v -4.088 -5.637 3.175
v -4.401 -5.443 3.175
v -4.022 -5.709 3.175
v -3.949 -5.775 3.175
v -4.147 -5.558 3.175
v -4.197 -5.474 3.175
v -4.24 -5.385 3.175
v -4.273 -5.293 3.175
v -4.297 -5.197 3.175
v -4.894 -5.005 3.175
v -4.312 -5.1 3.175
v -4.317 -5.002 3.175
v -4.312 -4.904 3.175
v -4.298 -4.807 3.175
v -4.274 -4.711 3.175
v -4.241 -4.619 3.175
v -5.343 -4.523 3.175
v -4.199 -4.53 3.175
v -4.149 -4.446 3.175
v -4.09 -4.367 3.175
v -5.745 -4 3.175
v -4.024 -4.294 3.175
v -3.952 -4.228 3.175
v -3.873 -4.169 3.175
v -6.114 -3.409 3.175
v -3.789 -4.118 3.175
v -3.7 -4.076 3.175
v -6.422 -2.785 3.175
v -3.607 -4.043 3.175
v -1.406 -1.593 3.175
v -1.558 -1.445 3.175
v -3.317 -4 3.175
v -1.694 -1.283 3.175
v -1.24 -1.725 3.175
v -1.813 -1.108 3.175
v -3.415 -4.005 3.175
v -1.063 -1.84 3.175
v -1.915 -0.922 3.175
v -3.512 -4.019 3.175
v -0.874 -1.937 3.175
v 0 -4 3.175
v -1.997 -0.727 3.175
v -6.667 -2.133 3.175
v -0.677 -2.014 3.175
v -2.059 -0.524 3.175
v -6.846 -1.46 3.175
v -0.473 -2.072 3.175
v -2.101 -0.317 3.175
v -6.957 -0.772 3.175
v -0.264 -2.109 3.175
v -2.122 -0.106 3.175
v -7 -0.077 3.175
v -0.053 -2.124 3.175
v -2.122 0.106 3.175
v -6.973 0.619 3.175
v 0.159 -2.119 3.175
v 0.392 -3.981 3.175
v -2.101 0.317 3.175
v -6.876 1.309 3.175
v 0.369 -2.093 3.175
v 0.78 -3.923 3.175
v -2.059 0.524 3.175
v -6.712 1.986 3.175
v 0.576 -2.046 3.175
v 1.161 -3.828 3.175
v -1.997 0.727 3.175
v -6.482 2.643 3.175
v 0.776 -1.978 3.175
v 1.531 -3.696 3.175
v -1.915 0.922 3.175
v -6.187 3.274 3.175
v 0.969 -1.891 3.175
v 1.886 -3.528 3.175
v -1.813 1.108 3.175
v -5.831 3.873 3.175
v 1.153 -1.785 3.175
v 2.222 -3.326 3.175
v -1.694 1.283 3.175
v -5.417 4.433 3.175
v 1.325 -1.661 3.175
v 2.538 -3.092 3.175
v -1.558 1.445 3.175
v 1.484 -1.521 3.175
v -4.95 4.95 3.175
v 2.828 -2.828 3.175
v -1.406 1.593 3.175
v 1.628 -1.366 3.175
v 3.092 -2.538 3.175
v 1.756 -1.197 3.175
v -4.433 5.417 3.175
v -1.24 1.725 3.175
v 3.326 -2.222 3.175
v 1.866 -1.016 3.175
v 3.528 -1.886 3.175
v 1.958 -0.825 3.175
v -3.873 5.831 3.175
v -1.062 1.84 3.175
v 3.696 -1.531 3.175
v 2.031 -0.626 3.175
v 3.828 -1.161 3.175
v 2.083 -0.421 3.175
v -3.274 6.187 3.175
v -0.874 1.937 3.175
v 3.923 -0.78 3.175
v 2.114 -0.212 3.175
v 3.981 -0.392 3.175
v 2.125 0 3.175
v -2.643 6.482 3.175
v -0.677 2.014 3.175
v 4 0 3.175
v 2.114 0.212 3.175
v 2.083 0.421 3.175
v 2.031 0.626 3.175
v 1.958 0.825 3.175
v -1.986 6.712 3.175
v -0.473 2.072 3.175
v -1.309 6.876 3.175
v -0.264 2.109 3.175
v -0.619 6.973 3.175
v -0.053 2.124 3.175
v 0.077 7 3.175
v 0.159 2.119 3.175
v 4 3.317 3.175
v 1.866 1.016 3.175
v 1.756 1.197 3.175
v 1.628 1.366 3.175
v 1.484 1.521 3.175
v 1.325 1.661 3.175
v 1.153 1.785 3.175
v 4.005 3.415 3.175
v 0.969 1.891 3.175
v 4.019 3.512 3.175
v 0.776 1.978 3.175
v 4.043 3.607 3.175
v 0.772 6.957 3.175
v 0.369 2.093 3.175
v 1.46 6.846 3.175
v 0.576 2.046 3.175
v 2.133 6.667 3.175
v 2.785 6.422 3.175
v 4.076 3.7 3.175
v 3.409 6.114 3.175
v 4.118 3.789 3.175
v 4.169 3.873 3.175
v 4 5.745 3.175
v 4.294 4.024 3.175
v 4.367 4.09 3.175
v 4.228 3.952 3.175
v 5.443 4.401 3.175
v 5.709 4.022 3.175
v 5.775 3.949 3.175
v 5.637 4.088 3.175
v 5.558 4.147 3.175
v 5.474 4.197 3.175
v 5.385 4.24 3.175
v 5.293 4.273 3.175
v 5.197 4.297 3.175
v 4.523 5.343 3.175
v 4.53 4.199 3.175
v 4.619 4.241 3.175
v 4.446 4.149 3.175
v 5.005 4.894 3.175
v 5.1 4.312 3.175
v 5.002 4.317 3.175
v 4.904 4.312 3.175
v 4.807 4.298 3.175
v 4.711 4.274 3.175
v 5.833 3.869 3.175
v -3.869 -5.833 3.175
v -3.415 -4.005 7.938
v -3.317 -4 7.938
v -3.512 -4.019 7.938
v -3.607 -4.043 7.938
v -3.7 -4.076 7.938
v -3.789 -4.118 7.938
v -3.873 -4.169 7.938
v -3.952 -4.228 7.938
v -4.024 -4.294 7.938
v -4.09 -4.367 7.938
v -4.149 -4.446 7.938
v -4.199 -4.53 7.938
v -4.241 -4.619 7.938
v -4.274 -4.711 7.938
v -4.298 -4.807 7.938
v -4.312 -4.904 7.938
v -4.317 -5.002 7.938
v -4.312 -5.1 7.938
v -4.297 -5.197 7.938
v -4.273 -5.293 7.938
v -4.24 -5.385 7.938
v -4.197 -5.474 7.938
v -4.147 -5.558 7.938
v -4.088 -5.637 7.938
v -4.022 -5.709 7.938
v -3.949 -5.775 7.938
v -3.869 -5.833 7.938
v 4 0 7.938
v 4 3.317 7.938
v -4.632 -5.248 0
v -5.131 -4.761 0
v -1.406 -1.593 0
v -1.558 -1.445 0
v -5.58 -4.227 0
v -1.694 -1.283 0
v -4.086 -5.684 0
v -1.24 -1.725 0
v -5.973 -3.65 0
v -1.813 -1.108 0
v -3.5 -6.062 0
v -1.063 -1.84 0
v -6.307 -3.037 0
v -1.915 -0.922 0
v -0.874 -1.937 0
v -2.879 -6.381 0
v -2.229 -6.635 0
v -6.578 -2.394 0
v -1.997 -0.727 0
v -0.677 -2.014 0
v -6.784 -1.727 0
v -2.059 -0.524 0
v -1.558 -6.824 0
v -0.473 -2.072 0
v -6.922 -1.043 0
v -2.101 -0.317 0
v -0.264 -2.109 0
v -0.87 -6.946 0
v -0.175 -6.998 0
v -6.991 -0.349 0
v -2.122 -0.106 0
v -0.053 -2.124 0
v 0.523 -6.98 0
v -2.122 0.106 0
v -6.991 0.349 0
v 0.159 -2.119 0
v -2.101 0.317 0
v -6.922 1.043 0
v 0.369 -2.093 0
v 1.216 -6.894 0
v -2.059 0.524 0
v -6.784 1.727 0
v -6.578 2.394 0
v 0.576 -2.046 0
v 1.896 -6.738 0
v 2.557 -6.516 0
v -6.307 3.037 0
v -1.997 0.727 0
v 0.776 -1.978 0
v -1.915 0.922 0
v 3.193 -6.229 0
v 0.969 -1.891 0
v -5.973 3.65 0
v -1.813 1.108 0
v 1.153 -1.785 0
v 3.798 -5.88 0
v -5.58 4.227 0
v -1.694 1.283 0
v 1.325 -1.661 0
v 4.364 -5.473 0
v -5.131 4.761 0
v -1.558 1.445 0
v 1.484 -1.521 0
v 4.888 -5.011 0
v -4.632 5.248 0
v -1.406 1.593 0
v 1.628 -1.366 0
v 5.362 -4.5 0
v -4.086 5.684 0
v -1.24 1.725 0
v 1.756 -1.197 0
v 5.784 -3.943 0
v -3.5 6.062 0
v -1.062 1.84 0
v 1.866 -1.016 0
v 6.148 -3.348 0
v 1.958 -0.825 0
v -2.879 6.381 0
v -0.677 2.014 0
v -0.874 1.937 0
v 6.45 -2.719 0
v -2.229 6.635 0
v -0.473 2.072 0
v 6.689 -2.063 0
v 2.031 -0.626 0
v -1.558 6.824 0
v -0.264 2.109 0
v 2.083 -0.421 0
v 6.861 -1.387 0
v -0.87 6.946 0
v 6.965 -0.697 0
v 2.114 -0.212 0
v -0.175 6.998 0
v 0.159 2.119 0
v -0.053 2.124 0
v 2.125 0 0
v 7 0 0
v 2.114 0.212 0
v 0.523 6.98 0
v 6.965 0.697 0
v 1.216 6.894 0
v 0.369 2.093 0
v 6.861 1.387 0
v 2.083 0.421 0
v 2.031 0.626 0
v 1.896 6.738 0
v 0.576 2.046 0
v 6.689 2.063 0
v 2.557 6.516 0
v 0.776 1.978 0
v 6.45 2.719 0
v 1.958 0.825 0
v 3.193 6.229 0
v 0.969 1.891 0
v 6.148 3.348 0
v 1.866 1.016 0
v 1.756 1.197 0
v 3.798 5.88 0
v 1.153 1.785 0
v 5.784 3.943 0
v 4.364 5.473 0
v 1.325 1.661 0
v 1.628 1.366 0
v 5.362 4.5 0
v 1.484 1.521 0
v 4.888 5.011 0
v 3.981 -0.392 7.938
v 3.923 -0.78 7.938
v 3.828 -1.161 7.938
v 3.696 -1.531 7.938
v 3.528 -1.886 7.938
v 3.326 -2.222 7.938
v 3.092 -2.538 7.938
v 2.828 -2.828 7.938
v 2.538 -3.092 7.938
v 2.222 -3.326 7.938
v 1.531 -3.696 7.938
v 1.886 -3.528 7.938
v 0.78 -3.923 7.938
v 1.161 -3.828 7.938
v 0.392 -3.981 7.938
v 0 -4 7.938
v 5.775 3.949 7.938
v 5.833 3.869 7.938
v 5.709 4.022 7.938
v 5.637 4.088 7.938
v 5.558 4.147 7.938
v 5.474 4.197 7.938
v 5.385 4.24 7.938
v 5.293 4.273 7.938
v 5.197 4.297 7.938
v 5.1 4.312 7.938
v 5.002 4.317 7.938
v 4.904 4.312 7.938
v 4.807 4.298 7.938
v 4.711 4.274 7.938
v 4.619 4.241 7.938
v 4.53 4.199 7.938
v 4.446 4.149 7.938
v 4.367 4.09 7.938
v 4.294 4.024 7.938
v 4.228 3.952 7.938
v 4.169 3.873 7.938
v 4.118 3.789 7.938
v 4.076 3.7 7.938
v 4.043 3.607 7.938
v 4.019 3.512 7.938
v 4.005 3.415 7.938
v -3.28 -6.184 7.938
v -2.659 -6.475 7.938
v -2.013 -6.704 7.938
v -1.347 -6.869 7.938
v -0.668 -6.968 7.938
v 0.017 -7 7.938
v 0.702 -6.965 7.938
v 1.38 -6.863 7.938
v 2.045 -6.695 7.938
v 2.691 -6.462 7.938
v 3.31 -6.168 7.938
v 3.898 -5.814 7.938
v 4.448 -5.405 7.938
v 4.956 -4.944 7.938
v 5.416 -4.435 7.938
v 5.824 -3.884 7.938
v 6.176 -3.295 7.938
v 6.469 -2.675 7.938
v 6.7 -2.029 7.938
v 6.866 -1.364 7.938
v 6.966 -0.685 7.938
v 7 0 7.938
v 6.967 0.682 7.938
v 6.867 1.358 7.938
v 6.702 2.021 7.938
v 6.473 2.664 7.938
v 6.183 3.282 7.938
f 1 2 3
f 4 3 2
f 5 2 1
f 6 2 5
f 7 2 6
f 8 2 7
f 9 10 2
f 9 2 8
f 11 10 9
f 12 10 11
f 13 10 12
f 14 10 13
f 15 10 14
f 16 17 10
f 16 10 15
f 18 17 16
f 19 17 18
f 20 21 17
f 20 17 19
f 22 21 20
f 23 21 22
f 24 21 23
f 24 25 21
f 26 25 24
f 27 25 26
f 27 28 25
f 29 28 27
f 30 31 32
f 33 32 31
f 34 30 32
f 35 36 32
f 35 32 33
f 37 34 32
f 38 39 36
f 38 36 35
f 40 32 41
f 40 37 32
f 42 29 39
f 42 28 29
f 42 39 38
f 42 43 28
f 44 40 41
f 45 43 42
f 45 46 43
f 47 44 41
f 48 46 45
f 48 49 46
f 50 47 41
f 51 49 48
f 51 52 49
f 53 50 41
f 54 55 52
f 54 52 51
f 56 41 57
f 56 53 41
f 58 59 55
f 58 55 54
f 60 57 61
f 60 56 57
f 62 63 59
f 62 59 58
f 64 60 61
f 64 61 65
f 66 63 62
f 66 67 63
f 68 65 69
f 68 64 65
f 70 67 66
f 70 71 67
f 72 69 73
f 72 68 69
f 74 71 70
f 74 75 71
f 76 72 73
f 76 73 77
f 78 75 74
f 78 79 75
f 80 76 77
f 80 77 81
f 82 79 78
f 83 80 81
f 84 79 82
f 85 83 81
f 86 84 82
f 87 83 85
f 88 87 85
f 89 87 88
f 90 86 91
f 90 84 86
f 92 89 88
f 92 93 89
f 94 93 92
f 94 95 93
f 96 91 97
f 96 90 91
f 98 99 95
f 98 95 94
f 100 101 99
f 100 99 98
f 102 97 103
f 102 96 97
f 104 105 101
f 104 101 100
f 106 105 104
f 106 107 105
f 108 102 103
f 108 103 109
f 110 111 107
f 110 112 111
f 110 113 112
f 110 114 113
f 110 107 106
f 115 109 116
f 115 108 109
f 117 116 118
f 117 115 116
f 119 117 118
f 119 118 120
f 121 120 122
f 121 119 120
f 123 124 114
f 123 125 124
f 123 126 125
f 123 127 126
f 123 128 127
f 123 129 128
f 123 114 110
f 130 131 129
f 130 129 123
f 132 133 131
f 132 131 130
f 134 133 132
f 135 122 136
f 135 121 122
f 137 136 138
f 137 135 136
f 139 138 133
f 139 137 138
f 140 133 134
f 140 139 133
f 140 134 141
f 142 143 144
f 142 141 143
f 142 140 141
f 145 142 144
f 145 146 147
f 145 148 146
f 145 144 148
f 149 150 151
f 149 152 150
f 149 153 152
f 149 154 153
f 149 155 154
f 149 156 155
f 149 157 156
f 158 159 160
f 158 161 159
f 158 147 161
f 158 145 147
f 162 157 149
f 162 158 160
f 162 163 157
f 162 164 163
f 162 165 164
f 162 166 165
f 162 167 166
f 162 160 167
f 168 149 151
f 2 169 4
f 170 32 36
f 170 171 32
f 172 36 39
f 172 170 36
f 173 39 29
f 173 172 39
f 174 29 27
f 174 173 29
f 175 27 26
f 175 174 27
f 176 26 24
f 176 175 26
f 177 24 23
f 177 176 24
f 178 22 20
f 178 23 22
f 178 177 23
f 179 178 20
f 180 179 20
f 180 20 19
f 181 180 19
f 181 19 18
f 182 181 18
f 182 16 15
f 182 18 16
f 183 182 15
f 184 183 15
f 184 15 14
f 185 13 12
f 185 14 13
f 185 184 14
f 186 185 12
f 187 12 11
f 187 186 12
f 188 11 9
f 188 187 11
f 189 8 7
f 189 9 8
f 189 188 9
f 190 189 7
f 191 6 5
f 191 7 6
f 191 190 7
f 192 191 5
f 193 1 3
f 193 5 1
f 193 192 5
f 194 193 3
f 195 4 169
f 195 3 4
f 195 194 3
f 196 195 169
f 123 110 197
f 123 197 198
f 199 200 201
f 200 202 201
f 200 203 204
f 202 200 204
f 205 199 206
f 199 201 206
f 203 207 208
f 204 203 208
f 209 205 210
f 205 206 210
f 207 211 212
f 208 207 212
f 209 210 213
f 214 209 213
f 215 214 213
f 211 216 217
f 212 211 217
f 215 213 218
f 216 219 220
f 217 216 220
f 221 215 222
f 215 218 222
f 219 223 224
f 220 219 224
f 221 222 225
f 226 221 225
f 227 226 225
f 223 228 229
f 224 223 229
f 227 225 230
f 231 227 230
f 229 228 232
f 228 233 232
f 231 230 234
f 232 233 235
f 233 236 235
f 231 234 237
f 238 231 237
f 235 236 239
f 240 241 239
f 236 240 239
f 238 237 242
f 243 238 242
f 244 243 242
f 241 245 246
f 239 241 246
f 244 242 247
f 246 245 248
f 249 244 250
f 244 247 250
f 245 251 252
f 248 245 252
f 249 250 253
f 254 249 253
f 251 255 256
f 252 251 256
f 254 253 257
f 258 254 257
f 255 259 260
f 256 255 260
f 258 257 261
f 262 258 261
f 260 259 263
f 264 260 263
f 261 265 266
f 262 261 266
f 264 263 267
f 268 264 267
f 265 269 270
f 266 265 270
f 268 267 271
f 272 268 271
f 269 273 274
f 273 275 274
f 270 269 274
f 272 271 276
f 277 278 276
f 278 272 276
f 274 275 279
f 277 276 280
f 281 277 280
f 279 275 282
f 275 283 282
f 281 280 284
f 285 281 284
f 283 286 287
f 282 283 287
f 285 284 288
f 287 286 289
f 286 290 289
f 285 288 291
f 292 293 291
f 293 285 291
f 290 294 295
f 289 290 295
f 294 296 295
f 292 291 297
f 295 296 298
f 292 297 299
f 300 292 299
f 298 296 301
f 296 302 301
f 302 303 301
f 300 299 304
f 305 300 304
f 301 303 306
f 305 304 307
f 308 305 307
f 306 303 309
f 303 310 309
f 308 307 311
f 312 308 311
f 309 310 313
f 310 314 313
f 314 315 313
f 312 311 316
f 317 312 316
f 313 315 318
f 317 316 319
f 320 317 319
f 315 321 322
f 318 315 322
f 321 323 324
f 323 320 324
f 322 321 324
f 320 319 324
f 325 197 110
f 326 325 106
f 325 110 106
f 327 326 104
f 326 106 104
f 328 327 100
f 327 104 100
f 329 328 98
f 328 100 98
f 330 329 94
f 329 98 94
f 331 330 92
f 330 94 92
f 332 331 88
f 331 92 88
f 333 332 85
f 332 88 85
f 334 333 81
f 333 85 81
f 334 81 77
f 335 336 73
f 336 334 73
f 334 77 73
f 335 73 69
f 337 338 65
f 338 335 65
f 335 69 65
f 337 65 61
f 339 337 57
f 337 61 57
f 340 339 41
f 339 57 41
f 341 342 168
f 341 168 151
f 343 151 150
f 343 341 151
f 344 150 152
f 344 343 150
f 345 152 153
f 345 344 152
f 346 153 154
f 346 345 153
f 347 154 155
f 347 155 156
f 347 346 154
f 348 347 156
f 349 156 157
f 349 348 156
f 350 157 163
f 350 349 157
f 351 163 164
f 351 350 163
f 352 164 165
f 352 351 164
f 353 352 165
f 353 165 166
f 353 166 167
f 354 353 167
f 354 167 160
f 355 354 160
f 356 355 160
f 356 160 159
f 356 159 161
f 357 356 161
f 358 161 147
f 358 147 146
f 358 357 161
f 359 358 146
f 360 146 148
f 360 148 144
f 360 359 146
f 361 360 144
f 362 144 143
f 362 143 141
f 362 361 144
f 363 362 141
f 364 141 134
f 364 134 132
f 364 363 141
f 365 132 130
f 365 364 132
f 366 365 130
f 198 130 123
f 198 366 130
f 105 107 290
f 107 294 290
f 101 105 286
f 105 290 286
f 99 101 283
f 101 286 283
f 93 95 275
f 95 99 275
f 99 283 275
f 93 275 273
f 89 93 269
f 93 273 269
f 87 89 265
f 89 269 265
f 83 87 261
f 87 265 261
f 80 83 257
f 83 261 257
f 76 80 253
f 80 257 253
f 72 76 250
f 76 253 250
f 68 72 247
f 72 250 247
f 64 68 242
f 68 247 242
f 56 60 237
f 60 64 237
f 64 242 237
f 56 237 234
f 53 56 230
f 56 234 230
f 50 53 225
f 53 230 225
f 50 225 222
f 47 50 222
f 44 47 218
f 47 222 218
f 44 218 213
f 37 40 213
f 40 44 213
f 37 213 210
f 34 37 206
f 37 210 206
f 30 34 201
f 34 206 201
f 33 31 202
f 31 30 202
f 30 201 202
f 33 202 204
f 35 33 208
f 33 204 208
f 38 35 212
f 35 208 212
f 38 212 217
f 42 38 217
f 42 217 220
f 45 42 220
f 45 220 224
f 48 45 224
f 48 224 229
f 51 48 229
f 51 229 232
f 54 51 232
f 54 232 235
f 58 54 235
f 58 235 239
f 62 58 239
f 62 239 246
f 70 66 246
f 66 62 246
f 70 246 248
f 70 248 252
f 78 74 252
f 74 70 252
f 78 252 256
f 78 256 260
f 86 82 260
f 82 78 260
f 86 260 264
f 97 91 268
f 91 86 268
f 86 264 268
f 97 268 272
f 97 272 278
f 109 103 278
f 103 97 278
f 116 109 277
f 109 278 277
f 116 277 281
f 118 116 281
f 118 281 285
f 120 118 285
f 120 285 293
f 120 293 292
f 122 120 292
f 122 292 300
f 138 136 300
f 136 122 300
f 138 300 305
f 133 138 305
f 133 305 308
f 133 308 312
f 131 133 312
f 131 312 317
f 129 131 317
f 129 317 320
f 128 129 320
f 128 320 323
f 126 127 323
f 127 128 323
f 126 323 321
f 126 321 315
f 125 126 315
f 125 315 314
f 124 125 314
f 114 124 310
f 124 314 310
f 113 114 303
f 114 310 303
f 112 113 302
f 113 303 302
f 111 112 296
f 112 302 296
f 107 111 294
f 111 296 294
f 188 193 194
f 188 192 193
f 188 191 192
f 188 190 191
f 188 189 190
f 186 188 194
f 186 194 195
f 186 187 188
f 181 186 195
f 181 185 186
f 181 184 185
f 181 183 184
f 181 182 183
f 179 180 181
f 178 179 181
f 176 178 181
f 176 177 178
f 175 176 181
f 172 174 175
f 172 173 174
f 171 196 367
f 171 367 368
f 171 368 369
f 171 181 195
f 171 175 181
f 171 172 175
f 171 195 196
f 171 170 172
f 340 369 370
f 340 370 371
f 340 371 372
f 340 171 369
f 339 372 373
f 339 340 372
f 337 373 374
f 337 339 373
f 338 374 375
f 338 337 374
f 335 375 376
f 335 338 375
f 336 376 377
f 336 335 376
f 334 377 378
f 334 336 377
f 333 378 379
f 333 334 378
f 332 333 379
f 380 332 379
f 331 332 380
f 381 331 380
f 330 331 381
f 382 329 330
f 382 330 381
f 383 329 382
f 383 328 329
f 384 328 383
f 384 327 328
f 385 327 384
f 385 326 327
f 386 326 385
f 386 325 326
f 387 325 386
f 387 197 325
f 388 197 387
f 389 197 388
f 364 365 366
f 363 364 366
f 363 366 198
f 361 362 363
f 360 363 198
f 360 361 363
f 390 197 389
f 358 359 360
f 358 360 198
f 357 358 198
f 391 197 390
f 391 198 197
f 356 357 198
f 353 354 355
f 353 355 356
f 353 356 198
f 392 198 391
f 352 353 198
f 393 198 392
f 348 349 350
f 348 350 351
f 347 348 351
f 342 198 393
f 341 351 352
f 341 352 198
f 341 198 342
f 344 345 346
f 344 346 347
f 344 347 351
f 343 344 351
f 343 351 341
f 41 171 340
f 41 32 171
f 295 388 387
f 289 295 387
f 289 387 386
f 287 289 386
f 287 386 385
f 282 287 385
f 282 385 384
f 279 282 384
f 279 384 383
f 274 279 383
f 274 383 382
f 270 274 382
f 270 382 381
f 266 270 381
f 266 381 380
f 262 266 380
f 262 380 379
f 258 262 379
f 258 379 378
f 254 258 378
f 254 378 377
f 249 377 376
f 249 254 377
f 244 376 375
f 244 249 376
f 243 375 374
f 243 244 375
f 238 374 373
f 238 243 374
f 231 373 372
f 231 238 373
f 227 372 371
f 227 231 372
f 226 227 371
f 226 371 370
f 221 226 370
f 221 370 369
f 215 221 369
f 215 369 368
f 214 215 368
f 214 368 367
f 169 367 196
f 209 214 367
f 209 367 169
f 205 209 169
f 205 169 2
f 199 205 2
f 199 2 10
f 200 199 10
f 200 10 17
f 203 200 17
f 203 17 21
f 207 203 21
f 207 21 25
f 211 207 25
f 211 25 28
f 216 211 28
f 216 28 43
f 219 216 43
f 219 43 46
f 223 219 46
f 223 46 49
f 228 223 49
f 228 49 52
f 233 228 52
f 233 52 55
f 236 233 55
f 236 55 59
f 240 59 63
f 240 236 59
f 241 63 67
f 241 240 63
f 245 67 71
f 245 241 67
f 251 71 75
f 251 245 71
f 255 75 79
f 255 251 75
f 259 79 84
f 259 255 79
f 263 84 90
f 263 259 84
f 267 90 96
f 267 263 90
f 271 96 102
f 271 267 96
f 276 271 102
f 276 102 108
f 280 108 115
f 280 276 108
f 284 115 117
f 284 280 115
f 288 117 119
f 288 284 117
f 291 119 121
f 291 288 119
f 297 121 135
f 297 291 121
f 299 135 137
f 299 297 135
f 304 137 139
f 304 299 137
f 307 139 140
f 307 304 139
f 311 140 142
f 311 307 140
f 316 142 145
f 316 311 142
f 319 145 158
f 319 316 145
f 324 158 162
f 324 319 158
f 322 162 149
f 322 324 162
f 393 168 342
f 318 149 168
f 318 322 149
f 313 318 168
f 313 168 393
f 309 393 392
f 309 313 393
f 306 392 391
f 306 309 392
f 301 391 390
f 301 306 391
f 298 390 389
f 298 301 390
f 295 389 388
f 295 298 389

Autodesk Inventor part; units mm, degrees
ref_plane "YZ Plane" through (0, 0, 0) normal (1, 0, 0) x (0, 1, 0)
ref_plane "XZ Plane" through (0, 0, 0) normal (0, 1, 0) x (-1, 0, 0)
ref_plane "XY Plane" through (0, 0, 0) normal (0, 0, 1) x (1, 0, 0)
sketch "Sketch1" plane through (0, 0, 0) normal (0, 0, 1) x (1, 0, 0)
  circle A0 centre (0, 0) radius 2.125
  circle A1 centre (0, 0) radius 7
  line L0 (0, 0) -> (0, 7) construction
  line L1 (4, 0) -> (4, 7)
  line L2 (-4, 7) -> (-4, 0)
  arc A2 (-4, 0) -> (4, 0) centre (0, 0) ccw
  arc A3 (4, 7) -> (-4, 7) centre (0, 7) ccw construction
  line L3 (0, 0) -> (-7, 0) construction
  line L4 (0, 4) -> (-7, 4)
  line L5 (-7, -4) -> (0, -4)
  arc A4 (0, -4) -> (0, 4) centre (0, 0) ccw
  arc A5 (-7, 4) -> (-7, -4) centre (-7, 0) ccw construction
  circle A6 centre (0, 13.35) radius 6.35 construction
  circle A7 centre (0, 10.35) radius 6.35 construction
  point P0 (0, 3.5)
  point P1 (-3.5, 0)
  point P2 (0, -4)
  point P3 (-5.7446, -4)
  point P4 (4, 5.7446)
  dimension "d0" = 4.25
  dimension "d3" = 14
  dimension "d4" = 8
  dimension "d5" = 8
  dimension "d6" = 90
  dimension "d7" = 12.7
  dimension "d8" = 12.7
extrude "Extrusion1" add sketch "Sketch1" along normal blind 3.175
extrude "Extrusion2" add sketch "Sketch1" along normal blind 7.9375 contours A1 L5 A2 L1
fillet "Fillet1" radius 1 2 edges at (4, 5.7446, 5.5563) (-5.7446, -4, 5.5563)
equation "\"d5\" = d4"
properties part number "Cam - Shell" material "Nylon 6/6"
